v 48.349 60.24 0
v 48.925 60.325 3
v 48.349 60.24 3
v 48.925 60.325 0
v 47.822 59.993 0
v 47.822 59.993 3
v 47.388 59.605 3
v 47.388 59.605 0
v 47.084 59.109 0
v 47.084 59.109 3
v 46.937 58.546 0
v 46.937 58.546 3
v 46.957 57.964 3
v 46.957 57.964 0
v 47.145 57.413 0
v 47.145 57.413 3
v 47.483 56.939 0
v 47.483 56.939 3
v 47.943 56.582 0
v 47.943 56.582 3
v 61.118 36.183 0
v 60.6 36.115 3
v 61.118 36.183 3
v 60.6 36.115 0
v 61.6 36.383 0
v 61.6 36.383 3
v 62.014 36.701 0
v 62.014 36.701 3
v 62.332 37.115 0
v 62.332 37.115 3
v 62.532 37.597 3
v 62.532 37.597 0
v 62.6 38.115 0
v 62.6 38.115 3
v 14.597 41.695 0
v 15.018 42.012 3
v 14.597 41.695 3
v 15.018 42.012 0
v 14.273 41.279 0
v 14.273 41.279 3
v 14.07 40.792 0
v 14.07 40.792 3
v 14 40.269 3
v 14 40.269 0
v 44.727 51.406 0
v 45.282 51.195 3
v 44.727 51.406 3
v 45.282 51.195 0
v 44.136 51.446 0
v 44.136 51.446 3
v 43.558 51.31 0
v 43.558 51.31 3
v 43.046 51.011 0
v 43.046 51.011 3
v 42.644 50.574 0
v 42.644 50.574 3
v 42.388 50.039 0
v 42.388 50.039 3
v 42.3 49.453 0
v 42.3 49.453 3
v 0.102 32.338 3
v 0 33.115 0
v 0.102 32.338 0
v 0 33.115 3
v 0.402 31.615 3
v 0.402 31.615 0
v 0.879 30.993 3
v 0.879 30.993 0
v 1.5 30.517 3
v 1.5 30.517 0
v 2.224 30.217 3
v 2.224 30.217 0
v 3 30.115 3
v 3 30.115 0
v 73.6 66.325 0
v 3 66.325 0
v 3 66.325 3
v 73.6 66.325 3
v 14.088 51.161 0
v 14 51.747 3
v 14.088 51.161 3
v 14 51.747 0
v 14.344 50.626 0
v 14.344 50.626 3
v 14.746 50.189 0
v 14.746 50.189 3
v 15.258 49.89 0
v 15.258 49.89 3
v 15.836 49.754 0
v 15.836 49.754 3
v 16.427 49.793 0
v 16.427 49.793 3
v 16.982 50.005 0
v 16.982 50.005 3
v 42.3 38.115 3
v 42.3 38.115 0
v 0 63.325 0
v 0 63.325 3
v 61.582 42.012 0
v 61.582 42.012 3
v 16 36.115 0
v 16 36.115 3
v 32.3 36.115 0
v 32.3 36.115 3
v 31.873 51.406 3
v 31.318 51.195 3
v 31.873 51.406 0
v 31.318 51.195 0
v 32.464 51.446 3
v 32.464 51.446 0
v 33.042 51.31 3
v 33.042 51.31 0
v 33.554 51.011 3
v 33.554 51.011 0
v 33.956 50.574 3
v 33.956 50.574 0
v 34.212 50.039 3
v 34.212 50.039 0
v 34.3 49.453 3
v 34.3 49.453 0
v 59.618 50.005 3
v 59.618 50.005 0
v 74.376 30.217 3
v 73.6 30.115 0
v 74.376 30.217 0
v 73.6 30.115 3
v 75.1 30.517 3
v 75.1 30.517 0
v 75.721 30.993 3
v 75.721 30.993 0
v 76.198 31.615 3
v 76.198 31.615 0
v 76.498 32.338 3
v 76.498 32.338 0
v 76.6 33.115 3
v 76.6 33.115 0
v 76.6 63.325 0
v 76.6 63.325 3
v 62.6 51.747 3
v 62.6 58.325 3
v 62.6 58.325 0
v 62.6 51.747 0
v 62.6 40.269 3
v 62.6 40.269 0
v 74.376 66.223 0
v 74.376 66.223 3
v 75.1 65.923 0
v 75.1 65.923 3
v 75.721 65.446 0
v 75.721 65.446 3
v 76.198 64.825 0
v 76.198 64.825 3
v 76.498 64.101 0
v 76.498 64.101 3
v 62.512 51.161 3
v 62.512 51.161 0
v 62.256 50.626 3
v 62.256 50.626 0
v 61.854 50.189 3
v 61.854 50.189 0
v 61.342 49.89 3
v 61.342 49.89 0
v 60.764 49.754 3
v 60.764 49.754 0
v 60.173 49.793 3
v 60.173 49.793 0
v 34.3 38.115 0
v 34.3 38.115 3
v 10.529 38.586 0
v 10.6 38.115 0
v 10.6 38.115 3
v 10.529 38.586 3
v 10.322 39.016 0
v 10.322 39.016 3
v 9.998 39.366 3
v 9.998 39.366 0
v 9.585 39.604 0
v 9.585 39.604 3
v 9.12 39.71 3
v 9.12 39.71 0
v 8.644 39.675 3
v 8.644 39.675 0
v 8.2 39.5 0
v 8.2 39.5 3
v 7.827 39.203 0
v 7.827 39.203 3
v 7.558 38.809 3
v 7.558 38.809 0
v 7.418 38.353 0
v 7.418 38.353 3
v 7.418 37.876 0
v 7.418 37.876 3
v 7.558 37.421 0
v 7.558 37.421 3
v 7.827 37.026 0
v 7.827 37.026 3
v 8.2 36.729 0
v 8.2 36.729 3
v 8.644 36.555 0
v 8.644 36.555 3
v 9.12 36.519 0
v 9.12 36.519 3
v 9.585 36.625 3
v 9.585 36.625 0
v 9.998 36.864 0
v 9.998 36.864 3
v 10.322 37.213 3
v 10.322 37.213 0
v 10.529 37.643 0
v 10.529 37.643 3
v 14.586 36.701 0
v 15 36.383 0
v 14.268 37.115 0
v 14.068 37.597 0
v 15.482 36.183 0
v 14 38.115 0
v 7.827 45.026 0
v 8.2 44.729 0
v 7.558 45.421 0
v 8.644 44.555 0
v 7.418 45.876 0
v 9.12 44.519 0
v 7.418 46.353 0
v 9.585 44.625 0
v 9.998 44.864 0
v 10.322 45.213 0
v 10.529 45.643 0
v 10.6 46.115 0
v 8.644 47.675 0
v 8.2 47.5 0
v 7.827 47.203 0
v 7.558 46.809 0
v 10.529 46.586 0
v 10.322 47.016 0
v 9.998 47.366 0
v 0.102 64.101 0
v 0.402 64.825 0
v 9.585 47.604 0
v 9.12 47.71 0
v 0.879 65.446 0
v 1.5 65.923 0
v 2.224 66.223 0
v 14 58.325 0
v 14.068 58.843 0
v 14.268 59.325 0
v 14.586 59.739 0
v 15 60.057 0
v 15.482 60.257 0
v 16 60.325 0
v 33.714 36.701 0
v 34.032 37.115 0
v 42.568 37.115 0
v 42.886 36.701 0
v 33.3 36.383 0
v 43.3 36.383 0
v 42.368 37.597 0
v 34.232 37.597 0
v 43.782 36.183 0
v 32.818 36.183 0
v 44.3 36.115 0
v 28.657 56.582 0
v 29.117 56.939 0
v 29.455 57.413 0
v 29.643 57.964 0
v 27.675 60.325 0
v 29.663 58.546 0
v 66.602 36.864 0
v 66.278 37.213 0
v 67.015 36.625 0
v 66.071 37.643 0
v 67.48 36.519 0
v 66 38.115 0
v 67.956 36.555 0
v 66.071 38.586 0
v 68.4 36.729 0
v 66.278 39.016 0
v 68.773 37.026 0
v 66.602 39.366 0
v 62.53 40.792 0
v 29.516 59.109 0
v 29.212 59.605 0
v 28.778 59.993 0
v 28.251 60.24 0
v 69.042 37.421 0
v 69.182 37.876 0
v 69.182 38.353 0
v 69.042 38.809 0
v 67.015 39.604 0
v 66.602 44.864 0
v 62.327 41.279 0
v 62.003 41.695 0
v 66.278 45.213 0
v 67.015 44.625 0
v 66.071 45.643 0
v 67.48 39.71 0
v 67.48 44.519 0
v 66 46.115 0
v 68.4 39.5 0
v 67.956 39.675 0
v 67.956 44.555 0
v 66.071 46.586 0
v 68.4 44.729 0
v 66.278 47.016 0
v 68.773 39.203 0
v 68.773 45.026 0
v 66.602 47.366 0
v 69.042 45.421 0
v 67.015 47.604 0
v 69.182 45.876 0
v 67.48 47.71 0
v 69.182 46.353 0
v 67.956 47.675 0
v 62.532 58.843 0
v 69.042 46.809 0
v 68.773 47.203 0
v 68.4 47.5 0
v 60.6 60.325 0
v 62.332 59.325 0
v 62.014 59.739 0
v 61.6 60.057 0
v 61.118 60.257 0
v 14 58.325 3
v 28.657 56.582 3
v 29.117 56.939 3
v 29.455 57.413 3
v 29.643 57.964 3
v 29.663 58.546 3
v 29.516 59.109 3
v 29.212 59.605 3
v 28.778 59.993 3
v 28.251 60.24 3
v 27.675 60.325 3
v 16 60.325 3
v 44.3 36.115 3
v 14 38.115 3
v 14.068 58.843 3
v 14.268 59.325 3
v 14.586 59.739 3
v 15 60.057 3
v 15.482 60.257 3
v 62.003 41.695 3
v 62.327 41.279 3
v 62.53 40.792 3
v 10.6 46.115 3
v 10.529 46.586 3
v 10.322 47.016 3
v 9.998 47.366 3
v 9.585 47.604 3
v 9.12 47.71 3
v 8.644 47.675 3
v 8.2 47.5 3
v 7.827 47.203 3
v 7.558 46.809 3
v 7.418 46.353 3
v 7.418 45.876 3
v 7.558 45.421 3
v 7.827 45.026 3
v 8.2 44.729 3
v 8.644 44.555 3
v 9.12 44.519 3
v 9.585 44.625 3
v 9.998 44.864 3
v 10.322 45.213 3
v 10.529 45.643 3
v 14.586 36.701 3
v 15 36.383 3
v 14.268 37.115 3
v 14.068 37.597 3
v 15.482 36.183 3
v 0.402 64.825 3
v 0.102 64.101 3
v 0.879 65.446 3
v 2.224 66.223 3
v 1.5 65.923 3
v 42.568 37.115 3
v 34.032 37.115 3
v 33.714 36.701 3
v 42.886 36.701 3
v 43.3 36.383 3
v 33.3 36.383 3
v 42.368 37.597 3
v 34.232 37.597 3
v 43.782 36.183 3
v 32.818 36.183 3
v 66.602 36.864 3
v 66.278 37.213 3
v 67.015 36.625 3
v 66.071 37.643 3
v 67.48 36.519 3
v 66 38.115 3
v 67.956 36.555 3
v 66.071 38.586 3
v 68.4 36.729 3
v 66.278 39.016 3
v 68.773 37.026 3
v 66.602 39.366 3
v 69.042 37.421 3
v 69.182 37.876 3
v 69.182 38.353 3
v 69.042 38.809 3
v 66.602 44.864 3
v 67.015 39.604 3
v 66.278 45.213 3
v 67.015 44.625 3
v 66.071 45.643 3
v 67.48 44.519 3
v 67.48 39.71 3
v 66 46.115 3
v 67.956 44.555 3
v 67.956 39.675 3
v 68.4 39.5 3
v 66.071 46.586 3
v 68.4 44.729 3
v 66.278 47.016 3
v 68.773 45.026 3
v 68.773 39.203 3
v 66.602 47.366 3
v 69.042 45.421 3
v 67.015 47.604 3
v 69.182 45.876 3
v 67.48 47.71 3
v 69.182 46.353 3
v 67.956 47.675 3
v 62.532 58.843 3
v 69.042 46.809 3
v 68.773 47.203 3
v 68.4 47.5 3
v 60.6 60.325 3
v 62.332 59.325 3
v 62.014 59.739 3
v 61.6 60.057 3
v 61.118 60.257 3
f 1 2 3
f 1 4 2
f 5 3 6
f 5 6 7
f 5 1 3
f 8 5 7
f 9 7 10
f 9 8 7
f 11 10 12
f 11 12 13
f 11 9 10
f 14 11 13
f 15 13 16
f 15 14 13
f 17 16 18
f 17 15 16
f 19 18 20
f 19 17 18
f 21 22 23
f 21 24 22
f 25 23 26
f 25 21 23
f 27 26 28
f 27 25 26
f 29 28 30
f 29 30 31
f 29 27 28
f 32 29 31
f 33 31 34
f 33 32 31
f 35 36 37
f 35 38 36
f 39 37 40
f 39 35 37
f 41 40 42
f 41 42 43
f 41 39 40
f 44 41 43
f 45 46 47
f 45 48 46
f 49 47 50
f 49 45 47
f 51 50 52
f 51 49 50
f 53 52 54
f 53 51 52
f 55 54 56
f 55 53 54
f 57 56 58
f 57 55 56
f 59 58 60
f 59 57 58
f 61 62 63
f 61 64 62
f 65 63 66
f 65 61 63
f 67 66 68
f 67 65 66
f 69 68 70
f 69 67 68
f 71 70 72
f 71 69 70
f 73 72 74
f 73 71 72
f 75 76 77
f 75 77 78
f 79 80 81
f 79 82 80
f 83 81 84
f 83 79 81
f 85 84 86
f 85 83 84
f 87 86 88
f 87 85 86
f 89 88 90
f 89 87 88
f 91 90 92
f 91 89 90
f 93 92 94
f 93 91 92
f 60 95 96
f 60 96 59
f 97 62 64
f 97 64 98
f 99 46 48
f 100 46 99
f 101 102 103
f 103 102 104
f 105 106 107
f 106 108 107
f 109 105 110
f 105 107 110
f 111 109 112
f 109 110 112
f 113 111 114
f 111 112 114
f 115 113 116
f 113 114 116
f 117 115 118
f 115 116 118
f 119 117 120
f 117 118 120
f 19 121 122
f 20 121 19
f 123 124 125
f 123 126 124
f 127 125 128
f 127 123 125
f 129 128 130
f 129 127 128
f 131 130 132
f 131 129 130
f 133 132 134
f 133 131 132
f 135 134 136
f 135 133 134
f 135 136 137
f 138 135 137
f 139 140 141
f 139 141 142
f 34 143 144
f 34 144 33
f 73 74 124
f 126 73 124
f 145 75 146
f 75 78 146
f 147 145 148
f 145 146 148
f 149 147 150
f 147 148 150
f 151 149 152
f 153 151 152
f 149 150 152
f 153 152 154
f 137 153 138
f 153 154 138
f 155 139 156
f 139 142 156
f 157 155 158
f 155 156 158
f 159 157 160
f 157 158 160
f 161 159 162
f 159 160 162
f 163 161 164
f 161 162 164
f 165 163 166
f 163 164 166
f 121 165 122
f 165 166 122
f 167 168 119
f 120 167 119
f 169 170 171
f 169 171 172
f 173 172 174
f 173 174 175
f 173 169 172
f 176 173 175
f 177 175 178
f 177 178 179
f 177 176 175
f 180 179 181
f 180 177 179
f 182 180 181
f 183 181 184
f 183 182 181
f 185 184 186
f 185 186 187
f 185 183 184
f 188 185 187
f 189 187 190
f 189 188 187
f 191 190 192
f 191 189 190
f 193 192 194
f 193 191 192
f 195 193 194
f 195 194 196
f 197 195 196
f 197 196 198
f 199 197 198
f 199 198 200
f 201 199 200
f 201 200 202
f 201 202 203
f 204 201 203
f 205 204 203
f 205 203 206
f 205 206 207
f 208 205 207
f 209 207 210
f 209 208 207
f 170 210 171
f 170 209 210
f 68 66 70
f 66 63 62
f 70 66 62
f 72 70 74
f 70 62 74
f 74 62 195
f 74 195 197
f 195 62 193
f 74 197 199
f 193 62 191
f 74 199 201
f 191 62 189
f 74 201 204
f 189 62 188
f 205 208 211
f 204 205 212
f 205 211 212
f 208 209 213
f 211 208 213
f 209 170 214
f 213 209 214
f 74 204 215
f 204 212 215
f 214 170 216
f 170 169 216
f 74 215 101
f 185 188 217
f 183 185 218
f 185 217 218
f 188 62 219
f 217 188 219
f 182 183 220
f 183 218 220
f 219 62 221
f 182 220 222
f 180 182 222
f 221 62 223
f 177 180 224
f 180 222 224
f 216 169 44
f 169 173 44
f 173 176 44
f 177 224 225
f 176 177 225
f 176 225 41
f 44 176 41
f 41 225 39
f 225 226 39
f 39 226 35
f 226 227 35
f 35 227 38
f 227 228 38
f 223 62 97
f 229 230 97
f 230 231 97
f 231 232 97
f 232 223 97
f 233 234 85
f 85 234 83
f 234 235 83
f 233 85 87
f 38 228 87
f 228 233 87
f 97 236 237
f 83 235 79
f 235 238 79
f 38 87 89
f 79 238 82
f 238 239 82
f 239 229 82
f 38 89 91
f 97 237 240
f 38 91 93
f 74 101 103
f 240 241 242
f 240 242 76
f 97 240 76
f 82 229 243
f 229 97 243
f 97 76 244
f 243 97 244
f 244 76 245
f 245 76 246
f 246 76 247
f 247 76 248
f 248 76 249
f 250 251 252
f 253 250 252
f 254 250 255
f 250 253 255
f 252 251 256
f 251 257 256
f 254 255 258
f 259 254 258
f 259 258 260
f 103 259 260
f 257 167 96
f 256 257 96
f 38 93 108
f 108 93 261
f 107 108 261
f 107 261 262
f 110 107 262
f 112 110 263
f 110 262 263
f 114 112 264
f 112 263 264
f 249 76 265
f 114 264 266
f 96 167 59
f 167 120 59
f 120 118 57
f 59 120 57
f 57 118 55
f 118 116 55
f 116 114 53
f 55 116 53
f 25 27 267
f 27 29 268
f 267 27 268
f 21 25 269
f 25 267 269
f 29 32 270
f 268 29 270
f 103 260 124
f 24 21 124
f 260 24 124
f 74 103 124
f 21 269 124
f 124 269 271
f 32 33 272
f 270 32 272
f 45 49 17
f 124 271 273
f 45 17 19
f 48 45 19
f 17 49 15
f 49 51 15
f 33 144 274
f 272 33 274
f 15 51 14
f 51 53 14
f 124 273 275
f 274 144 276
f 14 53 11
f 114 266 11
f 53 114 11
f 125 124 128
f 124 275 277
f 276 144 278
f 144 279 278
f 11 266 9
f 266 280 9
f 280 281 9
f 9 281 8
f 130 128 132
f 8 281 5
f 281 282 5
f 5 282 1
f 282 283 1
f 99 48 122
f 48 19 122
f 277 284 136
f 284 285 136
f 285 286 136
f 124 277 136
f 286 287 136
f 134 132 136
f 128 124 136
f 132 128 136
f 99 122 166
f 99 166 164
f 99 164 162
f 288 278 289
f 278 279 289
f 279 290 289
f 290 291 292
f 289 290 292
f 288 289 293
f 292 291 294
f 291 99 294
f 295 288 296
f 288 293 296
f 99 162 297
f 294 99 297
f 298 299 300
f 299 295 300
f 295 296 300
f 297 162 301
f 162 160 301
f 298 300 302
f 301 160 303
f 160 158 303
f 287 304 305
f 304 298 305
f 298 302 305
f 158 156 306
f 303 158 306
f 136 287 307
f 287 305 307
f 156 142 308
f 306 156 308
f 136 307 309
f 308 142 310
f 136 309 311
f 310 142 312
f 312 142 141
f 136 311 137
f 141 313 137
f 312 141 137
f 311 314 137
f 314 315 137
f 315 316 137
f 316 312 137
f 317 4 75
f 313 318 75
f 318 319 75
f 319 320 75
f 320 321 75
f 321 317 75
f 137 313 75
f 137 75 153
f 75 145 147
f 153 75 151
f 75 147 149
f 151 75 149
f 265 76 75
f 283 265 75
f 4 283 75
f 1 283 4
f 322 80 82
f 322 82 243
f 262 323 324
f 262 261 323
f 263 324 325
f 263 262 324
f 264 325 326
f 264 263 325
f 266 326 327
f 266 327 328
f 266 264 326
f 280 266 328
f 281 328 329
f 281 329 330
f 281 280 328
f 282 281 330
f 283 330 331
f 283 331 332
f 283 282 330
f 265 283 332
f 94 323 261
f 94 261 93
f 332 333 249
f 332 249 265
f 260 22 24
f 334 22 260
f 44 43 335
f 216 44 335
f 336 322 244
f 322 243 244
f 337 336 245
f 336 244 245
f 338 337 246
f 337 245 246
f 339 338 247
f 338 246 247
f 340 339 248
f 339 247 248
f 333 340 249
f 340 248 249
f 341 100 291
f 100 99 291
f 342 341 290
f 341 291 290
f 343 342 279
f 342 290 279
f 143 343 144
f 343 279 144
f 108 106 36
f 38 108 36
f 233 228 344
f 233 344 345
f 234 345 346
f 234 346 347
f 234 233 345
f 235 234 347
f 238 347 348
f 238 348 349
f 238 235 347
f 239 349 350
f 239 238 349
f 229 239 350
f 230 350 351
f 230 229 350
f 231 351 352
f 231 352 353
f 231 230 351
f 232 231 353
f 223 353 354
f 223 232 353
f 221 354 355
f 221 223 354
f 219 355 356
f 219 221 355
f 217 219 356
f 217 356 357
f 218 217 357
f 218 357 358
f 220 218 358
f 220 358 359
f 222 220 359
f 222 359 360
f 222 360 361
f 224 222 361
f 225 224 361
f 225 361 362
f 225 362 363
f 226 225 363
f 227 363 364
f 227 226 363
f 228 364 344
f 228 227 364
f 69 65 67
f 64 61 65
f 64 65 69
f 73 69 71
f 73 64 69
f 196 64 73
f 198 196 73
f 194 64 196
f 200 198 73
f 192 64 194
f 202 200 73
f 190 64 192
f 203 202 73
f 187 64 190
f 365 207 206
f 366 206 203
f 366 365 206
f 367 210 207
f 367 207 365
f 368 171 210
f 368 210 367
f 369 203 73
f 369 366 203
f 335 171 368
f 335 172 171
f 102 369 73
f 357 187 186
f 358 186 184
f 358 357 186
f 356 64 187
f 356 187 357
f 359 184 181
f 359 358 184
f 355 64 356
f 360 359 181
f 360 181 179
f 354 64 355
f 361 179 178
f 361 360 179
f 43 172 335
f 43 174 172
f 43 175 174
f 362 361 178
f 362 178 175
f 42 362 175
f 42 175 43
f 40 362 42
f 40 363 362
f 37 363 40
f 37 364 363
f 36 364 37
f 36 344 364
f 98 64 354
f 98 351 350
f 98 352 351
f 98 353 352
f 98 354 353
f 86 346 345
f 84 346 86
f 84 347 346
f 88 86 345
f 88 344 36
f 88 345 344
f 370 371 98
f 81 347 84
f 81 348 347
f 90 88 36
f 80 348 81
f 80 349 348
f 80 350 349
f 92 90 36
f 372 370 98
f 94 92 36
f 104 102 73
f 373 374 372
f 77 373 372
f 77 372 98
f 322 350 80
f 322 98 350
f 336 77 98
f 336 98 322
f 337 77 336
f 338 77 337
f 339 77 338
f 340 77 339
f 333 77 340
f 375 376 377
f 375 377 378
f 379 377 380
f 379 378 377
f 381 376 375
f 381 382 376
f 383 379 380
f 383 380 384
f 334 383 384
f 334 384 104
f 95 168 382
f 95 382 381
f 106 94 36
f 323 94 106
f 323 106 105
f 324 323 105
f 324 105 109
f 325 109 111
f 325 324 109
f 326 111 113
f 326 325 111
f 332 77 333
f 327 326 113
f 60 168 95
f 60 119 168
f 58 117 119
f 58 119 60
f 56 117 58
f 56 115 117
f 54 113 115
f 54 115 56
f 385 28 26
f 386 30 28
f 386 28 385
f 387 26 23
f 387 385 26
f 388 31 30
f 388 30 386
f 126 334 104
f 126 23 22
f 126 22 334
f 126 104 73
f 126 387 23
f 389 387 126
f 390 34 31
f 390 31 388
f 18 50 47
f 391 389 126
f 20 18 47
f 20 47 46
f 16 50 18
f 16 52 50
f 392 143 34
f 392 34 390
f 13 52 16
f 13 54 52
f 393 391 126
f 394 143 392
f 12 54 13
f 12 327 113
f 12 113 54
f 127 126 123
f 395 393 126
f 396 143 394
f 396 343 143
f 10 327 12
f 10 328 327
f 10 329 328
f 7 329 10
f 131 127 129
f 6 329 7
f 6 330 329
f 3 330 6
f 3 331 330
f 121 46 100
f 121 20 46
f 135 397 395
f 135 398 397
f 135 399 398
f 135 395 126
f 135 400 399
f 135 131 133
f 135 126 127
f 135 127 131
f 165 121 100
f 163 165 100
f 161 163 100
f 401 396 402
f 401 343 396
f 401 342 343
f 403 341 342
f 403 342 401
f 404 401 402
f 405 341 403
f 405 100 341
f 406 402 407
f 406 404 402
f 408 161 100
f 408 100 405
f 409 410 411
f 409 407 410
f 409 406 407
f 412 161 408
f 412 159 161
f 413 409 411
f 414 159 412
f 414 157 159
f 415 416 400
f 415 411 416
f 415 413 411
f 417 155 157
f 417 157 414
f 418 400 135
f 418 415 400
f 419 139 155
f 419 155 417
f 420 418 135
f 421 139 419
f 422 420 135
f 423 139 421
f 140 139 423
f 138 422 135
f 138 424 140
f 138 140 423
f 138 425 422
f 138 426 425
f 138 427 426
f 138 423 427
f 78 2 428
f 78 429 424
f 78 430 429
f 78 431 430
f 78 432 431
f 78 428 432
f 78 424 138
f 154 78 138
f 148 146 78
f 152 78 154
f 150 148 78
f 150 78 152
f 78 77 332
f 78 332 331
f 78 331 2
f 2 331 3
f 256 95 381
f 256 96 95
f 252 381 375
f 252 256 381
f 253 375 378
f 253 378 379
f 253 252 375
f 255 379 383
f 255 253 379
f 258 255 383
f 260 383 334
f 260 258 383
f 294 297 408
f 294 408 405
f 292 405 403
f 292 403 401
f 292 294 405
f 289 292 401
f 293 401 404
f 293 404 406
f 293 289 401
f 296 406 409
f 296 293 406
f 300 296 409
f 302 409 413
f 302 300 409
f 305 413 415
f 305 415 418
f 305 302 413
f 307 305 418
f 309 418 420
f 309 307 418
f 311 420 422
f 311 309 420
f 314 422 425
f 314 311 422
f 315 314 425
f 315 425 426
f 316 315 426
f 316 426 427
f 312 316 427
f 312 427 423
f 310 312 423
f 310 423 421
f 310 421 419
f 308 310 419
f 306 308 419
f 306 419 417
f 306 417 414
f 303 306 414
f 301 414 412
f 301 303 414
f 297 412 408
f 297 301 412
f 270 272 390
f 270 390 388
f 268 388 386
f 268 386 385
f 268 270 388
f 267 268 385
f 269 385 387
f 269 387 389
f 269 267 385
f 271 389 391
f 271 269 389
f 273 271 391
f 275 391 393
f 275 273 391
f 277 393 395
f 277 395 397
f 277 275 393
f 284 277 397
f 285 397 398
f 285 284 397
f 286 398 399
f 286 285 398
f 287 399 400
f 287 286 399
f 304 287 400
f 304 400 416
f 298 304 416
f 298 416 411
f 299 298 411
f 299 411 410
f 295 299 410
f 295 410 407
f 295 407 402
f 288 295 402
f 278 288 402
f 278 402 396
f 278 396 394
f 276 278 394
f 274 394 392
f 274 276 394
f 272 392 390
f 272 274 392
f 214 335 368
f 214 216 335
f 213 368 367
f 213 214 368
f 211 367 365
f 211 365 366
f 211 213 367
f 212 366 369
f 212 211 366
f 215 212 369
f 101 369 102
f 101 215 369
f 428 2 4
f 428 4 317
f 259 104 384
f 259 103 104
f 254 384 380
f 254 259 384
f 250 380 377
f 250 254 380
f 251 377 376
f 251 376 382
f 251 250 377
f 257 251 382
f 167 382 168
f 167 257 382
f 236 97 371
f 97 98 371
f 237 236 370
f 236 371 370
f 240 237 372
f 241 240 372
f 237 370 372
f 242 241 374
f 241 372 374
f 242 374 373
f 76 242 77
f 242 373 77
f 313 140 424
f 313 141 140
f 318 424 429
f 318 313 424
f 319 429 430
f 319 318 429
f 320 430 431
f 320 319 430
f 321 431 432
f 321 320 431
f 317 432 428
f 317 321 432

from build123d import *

# Parameters (mm, degrees)
SKETCH_1_W          = 76.6
SKETCH_1_H          = 36.210235533
SKETCH_1_R          = 1.6
EXTRUDE_1_DEPTH     = 3
FILLET_1_R          = 3
CUT_EXTRUDE_1_DEPTH = 102.368446486
FILLET_2_R          = 2


with BuildPart() as part:
    # 草图1 → 凸台-拉伸1 (new body)
    with BuildSketch(Plane.XY):
        with Locations((38.3, 48.219854477)):
            Rectangle(SKETCH_1_W, SKETCH_1_H)
        with Locations((9, 38.11473671)):
            Circle(SKETCH_1_R, mode=Mode.SUBTRACT)
        with Locations((9, 46.11473671)):
            Circle(SKETCH_1_R, mode=Mode.SUBTRACT)
        with Locations(Location((67.6, 38.11473671, 0), (0, 0, 180))):
            Circle(SKETCH_1_R, mode=Mode.SUBTRACT)
        with Locations(Location((67.6, 46.11473671, 0), (0, 0, 180))):
            Circle(SKETCH_1_R, mode=Mode.SUBTRACT)
    extrude(amount=EXTRUDE_1_DEPTH)

    # 圆角1
    fillet_1_edges = [part.edges().sort_by_distance(p)[0] for p in [
        (0, 66.324972243, 1.5),
        (76.6, 66.324972243, 1.5),
        (76.6, 30.11473671, 1.5),
        (0, 30.11473671, 1.5),
    ]]
    fillet(fillet_1_edges, radius=FILLET_1_R)

    # 草图2 → 切除-拉伸1 (cut, through all)
    with BuildSketch(Plane.XY.offset(3)):
        Polygon((14, 60.324972243), (35.3, 60.324972243), (14, 48.324972243), align=None)
        Polygon((62.6, 48.324972243), (41.3, 60.324972243), (62.6, 60.324972243), align=None)
        Polygon((34.3, 52.874916108), (14, 41.43829639), (14, 36.11473671), (34.3, 36.11473671), align=None)
        Polygon((62.6, 41.43829639), (62.6, 36.11473671), (42.3, 36.11473671), (42.3, 52.874916108), align=None)
    extrude(amount=-CUT_EXTRUDE_1_DEPTH, mode=Mode.SUBTRACT)

    # 圆角2
    fillet_2_edges = [part.edges().sort_by_distance(p)[0] for p in [
        (42.3, 52.874916108, 1.5),
        (62.6, 41.43829639, 1.5),
        (62.6, 36.11473671, 1.5),
        (42.3, 36.11473671, 1.5),
        (34.3, 36.11473671, 1.5),
        (14, 36.11473671, 1.5),
        (14, 41.43829639, 1.5),
        (34.3, 52.874916108, 1.5),
        (62.6, 60.324972243, 1.5),
        (62.6, 48.324972243, 1.5),
        (41.3, 60.324972243, 1.5),
        (14, 48.324972243, 1.5),
        (14, 60.324972243, 1.5),
        (35.3, 60.324972243, 1.5),
    ]]
    fillet(fillet_2_edges, radius=FILLET_2_R)


solid = part.part
